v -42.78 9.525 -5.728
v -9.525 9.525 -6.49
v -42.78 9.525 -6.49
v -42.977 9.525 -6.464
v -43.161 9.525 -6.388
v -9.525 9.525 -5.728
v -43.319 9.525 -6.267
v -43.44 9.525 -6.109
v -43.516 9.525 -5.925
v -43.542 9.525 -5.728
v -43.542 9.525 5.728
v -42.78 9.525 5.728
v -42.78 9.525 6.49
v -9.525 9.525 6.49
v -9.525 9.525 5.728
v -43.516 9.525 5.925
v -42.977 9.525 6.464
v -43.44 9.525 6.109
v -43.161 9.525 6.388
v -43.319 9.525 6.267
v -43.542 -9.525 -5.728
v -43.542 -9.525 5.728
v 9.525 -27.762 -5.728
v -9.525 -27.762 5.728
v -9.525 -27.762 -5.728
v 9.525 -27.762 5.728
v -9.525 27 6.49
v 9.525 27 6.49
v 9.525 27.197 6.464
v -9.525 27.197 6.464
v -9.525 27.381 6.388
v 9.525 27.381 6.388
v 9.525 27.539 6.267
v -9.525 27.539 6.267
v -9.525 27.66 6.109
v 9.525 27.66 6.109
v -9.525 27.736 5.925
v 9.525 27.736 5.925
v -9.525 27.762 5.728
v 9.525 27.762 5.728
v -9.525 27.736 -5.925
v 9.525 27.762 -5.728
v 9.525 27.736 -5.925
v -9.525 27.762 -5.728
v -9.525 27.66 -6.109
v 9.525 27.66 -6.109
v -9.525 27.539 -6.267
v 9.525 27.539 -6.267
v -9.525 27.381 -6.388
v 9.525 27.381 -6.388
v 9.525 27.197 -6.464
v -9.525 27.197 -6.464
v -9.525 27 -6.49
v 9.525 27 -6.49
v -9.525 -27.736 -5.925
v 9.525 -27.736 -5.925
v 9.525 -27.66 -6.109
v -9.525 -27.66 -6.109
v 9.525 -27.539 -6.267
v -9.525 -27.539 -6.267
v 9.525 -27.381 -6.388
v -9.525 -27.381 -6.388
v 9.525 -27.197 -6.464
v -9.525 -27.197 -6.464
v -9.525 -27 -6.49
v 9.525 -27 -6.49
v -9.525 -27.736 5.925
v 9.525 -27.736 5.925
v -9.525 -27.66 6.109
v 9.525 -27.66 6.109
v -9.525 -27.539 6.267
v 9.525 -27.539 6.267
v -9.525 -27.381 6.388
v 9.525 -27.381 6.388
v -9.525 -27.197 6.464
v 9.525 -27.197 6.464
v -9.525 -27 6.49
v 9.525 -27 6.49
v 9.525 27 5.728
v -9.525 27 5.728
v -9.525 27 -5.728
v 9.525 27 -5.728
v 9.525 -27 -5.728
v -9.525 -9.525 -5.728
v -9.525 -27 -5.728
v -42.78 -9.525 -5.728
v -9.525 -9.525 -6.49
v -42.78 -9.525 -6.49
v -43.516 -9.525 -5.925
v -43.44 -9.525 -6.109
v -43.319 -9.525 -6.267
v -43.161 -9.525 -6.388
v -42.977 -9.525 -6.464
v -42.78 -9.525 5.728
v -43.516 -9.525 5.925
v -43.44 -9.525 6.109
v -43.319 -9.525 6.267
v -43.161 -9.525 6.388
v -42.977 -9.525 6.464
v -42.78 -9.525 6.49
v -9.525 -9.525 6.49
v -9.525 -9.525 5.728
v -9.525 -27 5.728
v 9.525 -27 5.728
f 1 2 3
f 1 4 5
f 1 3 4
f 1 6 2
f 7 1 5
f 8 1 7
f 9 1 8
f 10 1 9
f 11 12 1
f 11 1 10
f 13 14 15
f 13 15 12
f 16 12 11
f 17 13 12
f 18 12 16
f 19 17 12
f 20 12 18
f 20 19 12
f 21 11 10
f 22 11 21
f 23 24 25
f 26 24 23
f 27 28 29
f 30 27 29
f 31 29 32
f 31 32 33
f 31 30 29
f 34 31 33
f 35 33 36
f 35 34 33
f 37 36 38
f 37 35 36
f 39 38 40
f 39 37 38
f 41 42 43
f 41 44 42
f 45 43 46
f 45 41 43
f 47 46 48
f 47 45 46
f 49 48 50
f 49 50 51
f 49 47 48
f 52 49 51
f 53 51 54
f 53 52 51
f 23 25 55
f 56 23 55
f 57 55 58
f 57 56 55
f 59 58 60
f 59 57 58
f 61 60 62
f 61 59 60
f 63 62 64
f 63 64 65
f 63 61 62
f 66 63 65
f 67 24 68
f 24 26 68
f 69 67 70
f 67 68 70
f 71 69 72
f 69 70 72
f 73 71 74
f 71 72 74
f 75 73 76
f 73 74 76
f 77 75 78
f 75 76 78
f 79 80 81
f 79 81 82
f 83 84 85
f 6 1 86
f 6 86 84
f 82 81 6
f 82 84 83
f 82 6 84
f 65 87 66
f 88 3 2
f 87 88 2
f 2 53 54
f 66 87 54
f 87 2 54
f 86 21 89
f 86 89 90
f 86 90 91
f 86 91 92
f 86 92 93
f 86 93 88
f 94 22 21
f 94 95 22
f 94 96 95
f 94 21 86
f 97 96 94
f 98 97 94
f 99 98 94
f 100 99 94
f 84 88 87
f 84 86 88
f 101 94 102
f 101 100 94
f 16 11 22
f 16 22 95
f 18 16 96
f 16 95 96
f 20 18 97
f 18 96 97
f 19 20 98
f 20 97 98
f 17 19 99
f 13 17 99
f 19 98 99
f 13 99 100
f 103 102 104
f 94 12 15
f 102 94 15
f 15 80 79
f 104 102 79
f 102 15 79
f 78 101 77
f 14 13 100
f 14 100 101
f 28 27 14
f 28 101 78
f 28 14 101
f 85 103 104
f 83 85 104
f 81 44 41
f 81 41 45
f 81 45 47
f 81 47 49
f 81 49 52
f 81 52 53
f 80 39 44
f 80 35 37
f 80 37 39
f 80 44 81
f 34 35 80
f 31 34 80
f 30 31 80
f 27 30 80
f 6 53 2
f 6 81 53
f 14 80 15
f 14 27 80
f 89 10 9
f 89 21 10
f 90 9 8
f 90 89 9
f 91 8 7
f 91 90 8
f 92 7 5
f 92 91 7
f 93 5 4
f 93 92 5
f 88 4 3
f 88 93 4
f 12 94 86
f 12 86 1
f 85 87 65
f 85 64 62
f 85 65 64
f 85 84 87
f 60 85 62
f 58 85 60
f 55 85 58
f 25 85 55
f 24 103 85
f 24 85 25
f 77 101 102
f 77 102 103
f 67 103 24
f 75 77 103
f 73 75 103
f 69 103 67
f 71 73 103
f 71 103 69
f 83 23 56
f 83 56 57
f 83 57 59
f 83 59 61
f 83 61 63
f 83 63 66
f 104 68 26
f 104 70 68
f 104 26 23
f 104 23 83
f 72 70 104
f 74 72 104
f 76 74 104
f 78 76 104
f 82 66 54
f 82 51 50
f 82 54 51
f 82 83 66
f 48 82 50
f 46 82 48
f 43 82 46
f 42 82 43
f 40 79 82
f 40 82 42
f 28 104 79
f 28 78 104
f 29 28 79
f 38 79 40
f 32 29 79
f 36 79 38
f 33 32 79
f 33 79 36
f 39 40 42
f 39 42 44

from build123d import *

# Parameters (mm, degrees)
F1_DEPTH      = 6.4897
F1_DEPTH_BACK = 6.4897
F2_W          = 85.5599
F2_H          = 54.0004
F3_DEPTH      = 5.7277
F3_DEPTH_BACK = 5.7277
F4_R          = 0.762


with BuildPart() as f1:
    # F0 (on Top) → F1 (new body, two sides)
    with BuildSketch(Plane.XY) as f1_sk:
        Polygon((9.525, -27.7622), (9.525, 27.7622), (-9.525, 27.7622), (-9.525, 9.525), (-43.54195, 9.525), (-43.54195, -9.525), (-9.525, -9.525), (-9.525, -27.7622), align=None)
    extrude(amount=F1_DEPTH)
    extrude(f1_sk.sketch, amount=-F1_DEPTH_BACK)

    # F2 (on Top) → F3 (cut, two sides)
    with BuildSketch(Plane.XY) as f3_sk:
        Rectangle(F2_W, F2_H)
    extrude(amount=-F3_DEPTH, mode=Mode.SUBTRACT)
    extrude(f3_sk.sketch, amount=F3_DEPTH_BACK, mode=Mode.SUBTRACT)

    # F4
    f4_edges = [f1.edges().sort_by_distance(p)[0] for p in [
        (0, -27.7622, 6.4897),
        (0, -27.7622, -6.4897),
        (0, 27.7622, 6.4897),
        (0, 27.7622, -6.4897),
        (-43.54195, 0, -6.4897),
        (-43.54195, 0, 6.4897),
    ]]
    fillet(f4_edges, radius=F4_R)


solid = f1.part
